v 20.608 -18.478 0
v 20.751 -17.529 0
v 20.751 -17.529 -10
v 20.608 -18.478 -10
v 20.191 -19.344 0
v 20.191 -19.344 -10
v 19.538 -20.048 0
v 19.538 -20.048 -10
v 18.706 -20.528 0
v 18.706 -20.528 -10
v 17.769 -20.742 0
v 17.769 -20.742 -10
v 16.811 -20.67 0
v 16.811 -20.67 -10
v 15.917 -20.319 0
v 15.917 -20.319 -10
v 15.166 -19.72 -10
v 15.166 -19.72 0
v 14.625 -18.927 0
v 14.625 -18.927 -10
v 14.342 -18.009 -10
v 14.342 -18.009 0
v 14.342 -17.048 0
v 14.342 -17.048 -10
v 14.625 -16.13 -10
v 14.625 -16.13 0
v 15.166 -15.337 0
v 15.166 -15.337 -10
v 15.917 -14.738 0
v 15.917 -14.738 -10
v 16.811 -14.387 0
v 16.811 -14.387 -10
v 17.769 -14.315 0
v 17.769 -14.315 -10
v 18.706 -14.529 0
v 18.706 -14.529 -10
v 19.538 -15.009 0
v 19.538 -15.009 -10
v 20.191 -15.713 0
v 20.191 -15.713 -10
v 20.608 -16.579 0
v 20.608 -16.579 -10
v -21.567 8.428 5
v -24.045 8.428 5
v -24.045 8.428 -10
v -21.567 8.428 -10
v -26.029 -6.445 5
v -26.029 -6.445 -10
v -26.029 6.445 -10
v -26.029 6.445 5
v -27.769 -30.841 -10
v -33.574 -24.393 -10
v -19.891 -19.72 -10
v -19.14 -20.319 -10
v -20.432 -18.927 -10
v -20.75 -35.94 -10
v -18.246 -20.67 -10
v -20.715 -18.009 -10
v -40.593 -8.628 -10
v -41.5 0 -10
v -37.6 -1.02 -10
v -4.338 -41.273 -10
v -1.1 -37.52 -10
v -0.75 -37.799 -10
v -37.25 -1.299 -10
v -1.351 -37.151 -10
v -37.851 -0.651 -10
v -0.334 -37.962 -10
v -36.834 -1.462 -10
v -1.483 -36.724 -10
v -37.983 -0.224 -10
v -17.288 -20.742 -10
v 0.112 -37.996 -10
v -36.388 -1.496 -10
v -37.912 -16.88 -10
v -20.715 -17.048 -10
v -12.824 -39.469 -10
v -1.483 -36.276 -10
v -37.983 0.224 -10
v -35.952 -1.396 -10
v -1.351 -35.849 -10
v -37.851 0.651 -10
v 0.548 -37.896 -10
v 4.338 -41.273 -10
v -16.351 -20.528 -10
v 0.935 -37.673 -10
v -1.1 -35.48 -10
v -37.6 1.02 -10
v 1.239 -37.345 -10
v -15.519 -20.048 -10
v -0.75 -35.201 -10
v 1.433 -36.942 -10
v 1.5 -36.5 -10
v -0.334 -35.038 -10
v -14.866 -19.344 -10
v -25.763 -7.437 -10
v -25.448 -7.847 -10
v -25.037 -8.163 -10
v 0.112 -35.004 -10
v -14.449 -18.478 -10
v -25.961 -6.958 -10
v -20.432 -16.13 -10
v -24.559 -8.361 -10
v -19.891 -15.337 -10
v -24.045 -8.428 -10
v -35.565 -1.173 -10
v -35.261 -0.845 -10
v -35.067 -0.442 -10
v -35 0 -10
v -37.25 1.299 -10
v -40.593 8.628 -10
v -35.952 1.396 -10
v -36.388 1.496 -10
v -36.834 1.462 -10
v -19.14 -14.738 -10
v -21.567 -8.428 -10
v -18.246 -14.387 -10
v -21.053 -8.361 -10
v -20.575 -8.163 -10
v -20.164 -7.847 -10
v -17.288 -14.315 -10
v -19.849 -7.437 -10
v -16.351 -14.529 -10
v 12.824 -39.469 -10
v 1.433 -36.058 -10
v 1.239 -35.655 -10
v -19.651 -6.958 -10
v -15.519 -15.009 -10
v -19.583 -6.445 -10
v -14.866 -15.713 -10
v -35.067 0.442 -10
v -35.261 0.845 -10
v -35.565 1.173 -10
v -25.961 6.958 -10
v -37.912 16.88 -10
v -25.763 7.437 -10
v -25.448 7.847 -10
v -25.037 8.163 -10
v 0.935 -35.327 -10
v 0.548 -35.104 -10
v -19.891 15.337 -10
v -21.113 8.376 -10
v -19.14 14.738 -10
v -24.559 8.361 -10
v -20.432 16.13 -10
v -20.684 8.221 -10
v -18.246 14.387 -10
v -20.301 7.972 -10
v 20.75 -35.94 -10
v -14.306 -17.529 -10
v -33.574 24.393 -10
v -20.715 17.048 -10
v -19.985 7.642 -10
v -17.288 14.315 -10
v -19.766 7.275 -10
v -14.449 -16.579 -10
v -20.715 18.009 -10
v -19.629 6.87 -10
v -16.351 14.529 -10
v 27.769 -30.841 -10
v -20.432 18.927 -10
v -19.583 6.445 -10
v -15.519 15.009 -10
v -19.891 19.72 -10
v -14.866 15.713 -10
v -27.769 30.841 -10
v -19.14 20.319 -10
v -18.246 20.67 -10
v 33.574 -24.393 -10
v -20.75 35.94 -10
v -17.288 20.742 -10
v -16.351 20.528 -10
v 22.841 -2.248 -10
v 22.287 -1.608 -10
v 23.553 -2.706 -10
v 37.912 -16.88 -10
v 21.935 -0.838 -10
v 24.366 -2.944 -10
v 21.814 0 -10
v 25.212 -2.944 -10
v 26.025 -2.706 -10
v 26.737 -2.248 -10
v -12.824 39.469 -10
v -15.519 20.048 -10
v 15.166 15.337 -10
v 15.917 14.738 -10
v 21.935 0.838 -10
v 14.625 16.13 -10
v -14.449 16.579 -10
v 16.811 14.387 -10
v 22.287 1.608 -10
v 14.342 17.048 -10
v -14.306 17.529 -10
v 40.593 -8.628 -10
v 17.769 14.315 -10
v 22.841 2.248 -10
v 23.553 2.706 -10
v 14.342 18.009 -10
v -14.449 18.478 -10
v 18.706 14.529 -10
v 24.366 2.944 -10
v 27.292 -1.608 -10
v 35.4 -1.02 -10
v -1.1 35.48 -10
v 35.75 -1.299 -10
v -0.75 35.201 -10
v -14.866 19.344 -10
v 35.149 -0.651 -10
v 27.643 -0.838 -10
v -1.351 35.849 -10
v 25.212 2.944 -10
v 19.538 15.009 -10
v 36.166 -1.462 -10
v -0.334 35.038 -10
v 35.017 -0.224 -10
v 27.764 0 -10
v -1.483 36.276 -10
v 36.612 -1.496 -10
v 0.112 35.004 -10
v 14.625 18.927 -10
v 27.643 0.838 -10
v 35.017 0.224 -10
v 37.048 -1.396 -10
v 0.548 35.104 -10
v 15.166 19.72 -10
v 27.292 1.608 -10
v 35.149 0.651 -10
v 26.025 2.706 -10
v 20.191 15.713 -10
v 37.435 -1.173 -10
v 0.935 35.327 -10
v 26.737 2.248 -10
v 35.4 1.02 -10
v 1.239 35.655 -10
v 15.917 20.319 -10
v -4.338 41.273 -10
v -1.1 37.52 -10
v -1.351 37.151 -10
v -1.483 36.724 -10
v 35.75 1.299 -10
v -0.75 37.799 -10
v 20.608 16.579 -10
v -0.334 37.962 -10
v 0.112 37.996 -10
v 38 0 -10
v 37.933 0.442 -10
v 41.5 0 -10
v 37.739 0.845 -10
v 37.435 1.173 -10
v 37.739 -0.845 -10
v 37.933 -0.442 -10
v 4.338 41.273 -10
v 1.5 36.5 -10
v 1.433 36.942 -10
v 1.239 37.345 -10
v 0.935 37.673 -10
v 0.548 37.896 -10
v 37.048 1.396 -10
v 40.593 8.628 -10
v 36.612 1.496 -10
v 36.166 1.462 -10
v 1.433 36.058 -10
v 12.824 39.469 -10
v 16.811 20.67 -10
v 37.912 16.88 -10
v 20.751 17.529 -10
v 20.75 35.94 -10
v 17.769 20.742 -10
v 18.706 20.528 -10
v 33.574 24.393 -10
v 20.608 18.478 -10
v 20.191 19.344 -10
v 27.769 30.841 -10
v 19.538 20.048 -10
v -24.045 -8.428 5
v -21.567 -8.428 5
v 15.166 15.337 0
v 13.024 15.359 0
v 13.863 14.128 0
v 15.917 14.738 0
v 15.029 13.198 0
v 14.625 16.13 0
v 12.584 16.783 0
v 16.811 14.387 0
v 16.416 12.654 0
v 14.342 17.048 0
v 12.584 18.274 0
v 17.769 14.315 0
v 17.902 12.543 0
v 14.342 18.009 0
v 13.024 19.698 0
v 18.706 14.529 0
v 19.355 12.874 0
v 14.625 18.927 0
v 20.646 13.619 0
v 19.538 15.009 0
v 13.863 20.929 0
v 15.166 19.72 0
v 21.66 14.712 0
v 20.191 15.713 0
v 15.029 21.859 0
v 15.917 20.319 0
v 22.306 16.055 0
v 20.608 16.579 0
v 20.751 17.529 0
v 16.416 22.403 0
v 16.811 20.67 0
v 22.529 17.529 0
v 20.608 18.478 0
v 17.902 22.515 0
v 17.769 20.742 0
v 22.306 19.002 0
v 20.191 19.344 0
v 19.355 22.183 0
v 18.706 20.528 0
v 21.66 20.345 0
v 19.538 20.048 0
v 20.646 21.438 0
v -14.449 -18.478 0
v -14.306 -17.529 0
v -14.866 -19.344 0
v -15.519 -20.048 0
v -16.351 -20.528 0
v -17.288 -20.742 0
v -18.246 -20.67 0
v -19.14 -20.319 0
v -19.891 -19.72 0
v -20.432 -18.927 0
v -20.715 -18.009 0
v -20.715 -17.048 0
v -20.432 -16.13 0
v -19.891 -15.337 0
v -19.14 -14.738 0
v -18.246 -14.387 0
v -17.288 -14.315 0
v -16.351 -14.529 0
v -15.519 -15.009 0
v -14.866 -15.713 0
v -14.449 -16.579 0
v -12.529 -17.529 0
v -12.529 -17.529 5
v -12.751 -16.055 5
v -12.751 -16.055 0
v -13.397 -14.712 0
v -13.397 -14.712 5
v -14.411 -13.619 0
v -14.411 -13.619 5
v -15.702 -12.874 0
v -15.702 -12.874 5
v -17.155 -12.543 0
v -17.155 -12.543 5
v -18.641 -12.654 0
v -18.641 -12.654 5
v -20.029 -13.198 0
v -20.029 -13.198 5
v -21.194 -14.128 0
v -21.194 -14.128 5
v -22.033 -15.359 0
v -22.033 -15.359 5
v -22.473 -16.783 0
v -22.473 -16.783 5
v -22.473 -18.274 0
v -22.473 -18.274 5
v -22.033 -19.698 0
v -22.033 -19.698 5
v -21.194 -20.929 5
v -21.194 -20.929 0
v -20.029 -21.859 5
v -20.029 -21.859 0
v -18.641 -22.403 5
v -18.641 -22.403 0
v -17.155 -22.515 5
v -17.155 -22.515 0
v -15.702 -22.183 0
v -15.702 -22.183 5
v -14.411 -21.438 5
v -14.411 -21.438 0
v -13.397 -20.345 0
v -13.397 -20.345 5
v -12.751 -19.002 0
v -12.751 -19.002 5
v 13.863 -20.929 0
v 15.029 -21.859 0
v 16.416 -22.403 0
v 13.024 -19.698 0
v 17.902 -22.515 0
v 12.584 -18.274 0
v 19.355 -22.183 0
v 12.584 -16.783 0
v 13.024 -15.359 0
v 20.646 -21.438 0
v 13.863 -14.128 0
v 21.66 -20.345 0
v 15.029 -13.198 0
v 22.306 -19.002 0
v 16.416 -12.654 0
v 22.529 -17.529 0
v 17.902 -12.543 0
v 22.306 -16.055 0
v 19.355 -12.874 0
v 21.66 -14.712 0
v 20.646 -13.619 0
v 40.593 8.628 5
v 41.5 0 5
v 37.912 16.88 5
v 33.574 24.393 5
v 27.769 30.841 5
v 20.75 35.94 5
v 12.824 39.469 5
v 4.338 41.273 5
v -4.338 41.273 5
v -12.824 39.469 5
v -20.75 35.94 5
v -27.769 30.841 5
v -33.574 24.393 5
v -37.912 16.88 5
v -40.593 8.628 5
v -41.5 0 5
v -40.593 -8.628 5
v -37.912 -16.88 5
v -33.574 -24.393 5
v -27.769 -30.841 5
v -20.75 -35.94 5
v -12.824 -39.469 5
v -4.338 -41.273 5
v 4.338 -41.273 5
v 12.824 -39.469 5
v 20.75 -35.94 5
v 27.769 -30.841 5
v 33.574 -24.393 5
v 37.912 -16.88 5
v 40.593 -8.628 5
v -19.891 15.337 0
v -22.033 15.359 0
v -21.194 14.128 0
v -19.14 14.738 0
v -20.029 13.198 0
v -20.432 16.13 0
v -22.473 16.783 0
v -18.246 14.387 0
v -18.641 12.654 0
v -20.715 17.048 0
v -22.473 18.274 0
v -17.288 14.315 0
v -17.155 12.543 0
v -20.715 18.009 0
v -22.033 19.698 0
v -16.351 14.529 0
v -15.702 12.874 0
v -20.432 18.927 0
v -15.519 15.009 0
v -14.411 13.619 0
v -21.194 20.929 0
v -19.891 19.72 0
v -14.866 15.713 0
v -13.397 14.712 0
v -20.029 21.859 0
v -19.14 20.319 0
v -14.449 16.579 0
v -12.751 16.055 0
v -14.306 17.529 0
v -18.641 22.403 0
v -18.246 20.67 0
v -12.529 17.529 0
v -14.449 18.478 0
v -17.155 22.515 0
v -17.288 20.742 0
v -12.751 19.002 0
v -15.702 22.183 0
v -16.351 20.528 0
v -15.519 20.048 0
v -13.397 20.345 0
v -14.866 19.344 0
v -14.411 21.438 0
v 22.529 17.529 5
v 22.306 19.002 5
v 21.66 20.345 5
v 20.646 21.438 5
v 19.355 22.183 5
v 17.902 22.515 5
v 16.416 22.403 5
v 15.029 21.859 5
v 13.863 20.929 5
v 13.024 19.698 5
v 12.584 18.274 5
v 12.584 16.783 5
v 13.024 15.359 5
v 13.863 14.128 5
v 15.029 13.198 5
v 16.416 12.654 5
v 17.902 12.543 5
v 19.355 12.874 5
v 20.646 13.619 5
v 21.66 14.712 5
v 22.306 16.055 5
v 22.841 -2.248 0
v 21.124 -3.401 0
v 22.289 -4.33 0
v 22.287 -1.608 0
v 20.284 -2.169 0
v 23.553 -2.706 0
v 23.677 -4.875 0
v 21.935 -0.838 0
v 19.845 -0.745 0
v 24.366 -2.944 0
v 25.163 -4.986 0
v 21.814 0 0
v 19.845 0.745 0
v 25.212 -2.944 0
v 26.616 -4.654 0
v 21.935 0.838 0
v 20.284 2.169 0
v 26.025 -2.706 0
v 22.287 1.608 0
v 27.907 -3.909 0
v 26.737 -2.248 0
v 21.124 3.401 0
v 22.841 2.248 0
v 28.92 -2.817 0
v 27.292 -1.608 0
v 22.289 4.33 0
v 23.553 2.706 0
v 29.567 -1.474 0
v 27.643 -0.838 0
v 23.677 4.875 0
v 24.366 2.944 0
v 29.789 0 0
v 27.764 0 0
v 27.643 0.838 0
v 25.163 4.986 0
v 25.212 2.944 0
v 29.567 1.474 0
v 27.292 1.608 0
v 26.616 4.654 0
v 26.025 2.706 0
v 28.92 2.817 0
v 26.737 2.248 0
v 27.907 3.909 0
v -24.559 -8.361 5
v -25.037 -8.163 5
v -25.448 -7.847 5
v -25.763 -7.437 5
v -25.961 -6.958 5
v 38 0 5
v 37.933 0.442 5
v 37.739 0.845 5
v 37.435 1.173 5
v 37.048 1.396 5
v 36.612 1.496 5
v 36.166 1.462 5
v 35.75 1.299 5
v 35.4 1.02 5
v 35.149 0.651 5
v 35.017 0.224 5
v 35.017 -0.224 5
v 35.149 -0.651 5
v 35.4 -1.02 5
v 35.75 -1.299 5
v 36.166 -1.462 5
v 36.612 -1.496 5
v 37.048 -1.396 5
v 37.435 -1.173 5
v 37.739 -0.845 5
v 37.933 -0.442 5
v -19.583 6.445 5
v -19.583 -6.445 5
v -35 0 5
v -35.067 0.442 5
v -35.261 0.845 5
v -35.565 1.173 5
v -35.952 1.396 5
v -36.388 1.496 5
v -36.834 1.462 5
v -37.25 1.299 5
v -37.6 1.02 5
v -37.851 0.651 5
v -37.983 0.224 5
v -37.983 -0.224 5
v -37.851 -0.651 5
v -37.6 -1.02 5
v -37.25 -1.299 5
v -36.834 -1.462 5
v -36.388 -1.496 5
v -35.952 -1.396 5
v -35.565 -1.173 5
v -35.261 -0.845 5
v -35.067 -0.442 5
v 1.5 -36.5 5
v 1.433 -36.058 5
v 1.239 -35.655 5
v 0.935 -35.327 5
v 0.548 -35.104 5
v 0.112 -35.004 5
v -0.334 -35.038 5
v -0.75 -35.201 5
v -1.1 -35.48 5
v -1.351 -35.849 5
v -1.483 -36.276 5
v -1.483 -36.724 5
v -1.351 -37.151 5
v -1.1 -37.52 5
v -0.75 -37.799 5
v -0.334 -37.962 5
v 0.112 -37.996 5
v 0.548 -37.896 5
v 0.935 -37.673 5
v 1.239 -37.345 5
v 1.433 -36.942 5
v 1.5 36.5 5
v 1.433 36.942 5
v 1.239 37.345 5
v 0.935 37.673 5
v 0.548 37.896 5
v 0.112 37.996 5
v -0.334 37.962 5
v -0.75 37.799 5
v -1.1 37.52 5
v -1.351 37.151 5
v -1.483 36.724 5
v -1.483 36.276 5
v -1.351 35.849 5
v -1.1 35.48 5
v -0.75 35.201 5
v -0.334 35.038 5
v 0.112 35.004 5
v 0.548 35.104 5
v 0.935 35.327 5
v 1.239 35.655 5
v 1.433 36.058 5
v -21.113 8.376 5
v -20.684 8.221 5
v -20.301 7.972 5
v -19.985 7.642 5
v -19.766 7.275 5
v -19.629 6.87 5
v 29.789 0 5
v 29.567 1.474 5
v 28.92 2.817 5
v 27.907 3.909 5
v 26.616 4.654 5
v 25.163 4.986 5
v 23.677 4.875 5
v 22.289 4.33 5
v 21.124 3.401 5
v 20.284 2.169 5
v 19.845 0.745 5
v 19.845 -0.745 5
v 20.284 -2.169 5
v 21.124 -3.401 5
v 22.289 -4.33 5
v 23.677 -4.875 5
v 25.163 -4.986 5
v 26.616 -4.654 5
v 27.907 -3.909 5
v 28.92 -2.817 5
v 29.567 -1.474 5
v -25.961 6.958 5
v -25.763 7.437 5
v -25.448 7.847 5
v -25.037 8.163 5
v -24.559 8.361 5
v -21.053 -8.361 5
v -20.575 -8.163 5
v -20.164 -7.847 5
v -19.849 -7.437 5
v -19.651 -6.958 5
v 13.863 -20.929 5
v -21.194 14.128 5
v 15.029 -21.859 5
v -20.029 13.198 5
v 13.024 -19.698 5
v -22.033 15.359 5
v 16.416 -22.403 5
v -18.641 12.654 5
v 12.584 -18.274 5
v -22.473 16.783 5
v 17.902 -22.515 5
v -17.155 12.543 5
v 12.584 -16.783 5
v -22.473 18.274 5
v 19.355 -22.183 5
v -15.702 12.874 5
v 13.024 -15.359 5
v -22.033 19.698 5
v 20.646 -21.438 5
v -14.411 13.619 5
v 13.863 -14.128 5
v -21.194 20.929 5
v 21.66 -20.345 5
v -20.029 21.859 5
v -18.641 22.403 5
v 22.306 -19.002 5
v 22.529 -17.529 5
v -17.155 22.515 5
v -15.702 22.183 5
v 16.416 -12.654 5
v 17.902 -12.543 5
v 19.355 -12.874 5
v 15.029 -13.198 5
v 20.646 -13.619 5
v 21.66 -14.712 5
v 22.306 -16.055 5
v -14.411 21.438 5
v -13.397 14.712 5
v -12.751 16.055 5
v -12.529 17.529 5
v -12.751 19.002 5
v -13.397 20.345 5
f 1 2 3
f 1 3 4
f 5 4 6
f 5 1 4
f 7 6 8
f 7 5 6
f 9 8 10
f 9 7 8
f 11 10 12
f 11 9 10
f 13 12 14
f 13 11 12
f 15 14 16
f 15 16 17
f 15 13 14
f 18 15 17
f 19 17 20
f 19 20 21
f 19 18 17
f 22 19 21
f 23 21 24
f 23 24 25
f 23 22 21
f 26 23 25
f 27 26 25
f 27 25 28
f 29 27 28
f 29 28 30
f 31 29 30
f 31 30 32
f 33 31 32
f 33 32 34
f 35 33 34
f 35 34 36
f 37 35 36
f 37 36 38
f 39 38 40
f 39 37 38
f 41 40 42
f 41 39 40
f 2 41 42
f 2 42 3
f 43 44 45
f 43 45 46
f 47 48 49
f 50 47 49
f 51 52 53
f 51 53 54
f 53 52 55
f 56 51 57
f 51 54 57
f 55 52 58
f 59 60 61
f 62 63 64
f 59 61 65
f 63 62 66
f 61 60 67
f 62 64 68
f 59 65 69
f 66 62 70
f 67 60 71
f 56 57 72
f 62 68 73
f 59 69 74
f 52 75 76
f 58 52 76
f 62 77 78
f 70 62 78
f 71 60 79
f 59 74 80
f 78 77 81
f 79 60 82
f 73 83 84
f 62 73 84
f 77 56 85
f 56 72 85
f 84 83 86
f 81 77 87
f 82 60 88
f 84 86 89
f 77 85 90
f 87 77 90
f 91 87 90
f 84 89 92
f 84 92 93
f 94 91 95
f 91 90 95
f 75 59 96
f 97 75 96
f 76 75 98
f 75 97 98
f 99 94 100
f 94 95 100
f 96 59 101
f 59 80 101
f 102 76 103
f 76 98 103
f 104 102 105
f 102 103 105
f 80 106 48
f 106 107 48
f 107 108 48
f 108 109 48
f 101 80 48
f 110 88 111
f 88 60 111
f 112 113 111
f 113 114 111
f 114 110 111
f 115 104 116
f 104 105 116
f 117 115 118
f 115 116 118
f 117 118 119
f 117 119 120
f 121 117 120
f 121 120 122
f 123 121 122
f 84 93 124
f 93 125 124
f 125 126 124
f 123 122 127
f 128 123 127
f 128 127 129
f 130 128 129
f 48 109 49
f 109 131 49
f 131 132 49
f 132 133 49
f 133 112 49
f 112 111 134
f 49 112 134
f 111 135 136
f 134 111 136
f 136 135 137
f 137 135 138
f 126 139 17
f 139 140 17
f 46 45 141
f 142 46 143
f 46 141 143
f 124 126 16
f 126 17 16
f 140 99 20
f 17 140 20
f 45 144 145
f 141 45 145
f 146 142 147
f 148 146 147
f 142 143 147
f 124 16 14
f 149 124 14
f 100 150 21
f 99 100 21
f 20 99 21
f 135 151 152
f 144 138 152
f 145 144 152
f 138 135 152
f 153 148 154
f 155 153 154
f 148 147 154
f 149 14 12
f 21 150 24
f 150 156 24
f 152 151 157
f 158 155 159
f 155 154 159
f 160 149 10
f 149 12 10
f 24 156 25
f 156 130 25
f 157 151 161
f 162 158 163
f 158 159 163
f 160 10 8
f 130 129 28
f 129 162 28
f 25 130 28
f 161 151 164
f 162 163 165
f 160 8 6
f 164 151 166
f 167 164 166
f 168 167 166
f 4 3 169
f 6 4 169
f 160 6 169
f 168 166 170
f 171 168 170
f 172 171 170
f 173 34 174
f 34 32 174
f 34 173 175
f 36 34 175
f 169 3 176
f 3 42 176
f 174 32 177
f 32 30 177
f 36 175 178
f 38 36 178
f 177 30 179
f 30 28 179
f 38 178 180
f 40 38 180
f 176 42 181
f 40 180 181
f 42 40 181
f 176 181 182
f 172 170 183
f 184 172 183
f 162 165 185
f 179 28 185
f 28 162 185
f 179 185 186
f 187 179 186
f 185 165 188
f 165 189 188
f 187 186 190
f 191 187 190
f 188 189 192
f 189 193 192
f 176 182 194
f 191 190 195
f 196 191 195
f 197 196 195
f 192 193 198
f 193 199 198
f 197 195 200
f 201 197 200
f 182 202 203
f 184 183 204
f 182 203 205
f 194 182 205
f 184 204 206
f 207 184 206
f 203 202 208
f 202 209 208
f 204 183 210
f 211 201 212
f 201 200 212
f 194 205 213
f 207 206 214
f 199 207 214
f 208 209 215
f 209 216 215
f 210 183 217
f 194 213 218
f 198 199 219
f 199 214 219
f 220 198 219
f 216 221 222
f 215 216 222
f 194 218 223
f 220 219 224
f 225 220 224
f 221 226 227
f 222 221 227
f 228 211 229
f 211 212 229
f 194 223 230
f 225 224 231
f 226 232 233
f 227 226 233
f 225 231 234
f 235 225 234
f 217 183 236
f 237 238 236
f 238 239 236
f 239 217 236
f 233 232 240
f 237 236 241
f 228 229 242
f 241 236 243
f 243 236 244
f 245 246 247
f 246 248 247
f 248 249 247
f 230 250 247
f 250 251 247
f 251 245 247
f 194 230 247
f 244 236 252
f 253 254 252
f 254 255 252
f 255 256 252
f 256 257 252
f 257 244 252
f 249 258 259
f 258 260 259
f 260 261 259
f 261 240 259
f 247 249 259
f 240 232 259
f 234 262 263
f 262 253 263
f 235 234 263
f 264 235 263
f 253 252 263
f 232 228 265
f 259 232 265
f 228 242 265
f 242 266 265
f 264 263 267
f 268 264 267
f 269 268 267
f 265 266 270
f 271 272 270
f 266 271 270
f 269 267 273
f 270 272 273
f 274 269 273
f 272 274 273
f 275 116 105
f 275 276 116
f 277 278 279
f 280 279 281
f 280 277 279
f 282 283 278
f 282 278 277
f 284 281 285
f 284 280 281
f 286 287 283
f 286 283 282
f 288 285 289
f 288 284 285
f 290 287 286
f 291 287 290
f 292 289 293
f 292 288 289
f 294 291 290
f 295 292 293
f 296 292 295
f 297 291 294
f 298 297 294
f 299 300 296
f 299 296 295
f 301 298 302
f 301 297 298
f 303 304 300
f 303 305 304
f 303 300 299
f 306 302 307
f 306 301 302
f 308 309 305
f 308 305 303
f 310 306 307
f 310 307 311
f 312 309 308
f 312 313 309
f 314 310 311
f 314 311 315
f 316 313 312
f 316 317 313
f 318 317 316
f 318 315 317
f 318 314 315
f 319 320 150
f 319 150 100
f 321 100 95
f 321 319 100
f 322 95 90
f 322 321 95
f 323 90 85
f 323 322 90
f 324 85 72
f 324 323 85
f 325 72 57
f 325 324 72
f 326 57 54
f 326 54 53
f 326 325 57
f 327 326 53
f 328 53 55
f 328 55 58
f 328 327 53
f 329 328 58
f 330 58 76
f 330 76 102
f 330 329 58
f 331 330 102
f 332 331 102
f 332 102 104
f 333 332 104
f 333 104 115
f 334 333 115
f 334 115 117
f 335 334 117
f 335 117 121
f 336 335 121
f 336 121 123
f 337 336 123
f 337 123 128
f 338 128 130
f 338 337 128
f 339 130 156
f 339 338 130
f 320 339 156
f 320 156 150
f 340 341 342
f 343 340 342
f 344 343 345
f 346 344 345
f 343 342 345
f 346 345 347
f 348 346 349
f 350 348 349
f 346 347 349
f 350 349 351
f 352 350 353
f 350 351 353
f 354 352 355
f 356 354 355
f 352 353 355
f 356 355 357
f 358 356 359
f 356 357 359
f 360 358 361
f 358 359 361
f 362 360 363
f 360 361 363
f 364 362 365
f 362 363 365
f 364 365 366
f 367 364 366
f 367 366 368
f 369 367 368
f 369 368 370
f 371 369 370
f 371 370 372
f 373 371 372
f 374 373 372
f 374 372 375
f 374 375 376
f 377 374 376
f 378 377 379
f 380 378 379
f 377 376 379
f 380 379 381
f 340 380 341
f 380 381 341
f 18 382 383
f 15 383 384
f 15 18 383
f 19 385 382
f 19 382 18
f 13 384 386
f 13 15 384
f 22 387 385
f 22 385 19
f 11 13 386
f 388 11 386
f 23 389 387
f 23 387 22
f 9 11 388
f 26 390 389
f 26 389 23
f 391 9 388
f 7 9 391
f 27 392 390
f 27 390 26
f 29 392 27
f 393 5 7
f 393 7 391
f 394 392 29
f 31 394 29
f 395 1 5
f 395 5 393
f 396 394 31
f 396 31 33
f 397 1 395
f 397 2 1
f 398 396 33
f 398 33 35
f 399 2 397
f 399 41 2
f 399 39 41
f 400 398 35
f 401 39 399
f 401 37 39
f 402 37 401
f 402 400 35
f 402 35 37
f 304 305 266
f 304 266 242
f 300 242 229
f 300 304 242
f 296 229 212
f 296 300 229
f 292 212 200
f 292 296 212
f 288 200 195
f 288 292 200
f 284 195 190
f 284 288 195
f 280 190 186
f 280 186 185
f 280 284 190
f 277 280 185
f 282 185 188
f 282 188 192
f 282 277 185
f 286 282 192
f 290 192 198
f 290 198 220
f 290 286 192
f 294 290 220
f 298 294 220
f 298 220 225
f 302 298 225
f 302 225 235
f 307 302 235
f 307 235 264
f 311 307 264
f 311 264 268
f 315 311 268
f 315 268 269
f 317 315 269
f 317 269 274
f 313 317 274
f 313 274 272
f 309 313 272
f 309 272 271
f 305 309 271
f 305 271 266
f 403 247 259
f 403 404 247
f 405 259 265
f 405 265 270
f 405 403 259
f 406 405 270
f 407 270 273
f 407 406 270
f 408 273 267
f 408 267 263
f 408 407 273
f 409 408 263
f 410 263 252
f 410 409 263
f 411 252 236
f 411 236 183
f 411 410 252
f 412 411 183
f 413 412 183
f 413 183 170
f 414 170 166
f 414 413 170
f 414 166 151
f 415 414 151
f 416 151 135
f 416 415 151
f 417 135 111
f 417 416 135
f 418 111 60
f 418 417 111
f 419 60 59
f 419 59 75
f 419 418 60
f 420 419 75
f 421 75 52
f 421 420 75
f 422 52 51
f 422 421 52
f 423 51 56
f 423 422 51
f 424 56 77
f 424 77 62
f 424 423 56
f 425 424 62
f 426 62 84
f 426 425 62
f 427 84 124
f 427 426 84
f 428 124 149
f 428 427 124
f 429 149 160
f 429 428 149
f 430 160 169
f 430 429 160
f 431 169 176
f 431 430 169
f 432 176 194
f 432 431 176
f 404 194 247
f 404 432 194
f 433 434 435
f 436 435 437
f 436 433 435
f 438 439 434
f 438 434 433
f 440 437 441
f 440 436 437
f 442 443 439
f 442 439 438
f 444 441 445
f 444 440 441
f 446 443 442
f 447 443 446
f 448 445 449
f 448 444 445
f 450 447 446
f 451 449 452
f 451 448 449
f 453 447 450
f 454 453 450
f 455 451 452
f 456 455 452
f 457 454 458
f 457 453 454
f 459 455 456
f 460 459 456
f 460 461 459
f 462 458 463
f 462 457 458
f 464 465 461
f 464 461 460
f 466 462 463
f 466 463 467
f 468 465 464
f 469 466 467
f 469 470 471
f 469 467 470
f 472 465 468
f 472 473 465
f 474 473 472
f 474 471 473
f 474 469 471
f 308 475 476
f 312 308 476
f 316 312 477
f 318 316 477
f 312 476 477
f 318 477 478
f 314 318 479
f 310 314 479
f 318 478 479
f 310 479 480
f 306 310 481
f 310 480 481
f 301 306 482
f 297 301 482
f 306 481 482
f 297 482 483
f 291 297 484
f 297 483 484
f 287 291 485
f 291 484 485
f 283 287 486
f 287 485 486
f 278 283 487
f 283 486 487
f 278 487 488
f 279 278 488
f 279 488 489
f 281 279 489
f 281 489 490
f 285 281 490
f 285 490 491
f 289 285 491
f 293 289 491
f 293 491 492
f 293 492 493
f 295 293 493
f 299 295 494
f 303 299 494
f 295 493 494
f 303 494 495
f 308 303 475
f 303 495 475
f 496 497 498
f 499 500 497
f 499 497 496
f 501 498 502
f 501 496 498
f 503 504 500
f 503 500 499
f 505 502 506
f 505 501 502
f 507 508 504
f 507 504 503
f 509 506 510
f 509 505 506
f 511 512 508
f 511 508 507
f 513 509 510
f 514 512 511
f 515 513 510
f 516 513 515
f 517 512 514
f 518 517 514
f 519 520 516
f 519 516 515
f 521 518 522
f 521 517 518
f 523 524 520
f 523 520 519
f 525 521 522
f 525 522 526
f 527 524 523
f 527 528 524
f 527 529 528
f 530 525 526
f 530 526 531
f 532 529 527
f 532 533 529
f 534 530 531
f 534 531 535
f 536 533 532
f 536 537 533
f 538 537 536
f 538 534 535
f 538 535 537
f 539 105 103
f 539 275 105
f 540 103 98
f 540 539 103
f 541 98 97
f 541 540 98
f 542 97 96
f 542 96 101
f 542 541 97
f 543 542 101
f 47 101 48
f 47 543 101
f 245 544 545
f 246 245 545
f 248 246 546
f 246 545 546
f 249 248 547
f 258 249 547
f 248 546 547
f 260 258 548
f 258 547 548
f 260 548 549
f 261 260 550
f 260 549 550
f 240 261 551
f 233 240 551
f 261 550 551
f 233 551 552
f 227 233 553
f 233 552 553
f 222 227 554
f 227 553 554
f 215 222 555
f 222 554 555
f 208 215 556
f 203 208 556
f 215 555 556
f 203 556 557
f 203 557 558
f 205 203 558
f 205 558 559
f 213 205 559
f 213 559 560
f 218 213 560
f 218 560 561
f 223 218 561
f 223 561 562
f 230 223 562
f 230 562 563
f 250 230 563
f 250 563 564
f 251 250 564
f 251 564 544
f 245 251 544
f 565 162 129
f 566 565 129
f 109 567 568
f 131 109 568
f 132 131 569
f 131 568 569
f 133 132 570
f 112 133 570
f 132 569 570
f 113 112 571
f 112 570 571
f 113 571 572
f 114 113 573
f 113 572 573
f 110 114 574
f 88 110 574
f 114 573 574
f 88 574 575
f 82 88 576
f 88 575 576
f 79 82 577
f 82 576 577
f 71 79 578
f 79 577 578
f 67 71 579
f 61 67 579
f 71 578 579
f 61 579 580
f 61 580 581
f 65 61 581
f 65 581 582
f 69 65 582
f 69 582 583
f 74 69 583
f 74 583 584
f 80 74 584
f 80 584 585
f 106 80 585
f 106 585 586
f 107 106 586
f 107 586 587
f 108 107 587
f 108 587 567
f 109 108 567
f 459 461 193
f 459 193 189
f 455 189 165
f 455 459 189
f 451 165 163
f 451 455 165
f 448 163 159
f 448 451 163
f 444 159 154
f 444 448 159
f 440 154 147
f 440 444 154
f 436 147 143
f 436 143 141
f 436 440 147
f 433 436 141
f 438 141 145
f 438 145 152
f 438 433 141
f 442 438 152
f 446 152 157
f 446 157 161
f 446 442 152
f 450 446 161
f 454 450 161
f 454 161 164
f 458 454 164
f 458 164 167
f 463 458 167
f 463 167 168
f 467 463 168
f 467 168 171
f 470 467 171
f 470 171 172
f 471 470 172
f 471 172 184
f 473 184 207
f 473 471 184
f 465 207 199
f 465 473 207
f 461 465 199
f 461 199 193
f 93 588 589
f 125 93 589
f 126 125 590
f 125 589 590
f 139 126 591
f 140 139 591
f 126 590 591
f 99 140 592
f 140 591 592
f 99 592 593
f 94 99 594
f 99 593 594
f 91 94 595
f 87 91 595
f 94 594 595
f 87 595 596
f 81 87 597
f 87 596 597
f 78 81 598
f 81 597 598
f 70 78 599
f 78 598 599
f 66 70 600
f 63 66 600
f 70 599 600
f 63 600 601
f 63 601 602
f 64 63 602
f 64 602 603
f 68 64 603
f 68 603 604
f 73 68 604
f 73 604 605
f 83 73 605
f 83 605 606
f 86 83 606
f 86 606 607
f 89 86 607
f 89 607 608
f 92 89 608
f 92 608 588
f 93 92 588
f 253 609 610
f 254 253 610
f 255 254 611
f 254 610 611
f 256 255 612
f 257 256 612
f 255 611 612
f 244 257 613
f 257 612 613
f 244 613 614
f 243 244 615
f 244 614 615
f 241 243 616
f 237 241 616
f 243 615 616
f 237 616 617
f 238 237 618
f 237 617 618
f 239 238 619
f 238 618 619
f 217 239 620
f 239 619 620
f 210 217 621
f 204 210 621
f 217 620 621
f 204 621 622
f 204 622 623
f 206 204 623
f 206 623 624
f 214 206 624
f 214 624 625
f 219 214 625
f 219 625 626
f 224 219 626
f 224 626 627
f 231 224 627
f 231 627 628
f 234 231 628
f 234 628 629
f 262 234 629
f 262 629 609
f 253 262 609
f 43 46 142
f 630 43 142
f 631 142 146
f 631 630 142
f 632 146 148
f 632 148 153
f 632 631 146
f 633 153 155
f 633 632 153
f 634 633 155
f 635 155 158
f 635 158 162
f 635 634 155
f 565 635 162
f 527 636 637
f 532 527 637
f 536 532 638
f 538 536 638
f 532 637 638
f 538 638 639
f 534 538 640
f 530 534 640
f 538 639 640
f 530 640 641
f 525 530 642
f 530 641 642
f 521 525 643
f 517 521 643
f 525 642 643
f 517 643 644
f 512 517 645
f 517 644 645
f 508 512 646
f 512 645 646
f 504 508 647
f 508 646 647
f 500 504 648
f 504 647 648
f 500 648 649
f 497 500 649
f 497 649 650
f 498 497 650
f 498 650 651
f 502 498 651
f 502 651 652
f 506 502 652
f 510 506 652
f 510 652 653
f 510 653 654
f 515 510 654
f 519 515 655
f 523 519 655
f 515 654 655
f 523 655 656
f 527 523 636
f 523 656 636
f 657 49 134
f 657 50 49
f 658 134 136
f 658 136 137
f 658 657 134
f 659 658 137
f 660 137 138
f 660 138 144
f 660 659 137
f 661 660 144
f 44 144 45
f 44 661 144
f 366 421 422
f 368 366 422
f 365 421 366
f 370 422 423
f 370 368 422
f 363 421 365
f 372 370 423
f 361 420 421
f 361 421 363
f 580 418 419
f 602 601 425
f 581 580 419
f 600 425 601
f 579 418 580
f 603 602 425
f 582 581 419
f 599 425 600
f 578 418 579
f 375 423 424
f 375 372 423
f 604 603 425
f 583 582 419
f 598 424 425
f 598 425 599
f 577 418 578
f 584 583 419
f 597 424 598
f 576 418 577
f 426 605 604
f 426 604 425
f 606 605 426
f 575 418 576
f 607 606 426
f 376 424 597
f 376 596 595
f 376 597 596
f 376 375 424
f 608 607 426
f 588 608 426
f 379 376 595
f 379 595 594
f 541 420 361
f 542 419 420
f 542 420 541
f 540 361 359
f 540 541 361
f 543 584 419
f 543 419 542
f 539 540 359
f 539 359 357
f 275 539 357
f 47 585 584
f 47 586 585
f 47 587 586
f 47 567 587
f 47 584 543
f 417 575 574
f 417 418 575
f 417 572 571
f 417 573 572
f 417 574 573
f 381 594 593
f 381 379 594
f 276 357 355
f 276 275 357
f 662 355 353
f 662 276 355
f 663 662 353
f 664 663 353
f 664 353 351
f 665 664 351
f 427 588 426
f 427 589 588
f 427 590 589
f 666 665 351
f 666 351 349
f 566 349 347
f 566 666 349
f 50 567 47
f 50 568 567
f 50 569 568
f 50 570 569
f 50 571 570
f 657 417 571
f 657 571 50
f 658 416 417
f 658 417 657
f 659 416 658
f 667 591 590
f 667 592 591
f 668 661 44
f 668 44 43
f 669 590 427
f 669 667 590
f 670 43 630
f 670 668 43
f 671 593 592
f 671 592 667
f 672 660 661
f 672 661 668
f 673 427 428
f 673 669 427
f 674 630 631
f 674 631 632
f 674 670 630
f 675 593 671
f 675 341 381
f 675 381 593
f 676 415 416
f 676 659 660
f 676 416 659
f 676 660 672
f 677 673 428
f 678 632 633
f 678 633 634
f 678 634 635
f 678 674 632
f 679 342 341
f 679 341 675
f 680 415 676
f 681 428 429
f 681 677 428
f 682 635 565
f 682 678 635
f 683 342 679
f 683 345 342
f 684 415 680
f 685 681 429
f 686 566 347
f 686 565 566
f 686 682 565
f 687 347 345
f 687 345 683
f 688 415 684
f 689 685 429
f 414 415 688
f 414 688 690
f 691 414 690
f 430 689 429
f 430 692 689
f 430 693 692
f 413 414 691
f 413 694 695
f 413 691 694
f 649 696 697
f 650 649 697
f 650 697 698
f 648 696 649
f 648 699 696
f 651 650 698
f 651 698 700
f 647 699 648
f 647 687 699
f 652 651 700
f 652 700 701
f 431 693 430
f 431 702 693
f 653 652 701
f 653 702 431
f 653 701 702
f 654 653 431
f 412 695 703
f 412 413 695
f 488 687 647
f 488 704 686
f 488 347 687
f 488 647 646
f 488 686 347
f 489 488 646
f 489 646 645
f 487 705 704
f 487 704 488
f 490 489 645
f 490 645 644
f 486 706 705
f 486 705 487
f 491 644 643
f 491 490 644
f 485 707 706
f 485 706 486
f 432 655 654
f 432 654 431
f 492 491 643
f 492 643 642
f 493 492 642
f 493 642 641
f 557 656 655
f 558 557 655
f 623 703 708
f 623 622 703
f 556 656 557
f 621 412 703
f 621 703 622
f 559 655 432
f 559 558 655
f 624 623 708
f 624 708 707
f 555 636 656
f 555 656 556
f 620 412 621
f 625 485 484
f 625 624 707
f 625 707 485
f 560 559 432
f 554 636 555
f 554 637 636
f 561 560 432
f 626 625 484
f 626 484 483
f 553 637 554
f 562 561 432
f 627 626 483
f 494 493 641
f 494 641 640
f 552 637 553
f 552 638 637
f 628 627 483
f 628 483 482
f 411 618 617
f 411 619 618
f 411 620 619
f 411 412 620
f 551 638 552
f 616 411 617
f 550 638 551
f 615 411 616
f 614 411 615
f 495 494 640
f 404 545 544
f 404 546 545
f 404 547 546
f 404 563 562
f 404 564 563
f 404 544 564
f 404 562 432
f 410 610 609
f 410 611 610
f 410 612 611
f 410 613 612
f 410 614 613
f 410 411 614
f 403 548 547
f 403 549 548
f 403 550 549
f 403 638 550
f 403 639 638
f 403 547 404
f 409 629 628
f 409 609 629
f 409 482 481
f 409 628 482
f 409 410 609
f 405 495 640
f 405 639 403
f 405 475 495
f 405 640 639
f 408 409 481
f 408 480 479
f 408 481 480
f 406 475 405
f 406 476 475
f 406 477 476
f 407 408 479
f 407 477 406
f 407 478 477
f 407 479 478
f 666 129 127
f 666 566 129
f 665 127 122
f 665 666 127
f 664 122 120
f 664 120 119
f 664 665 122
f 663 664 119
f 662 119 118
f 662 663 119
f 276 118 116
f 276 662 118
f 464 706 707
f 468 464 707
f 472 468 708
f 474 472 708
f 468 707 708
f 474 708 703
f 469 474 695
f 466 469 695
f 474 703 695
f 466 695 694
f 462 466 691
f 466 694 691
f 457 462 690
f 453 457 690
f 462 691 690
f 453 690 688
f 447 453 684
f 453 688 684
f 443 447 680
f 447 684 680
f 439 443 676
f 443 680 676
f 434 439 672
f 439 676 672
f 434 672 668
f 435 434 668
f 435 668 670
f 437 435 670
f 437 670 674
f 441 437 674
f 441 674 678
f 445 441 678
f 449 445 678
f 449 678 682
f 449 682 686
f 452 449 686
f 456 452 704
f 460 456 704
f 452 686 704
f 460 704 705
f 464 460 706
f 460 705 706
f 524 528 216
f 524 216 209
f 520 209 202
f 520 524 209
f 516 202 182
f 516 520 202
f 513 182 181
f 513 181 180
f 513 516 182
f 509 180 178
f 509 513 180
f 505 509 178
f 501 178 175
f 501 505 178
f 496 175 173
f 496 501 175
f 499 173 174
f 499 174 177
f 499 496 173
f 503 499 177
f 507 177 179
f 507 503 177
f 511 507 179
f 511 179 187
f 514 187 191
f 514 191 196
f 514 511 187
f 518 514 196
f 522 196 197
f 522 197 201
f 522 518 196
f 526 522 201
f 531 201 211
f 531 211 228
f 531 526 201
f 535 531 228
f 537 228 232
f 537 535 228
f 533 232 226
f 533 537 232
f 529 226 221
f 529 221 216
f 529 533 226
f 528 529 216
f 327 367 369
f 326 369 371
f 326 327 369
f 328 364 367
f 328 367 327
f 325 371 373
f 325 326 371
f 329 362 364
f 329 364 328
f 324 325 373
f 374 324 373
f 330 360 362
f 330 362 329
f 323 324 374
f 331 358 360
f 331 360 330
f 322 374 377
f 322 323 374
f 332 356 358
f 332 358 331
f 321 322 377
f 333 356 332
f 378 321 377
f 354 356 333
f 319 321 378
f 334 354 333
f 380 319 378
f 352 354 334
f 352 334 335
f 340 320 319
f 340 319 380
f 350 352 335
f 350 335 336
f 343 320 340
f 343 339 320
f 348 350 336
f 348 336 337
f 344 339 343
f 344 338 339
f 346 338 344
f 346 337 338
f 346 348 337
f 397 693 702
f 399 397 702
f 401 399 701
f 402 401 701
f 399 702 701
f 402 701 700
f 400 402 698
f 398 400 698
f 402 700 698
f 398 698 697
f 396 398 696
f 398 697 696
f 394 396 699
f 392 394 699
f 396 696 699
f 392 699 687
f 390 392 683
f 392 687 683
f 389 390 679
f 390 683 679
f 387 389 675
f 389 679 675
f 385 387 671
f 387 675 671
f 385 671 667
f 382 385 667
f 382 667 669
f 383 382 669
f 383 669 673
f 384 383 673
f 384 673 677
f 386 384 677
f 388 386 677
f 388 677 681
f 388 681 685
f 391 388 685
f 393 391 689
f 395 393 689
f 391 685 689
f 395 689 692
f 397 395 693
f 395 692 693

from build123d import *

# Parameters (mm, degrees)
SKETCH_1_R           = 41.5
EXTRUDE_1_DEPTH      = 5
EXTRUDE_1_DEPTH_BACK = 10
SKETCH_2_R           = 5
CUT_EXTRUDE_1_DEPTH  = 5
SKETCH_4_R           = 1.5
CUT_EXTRUDE_2_DEPTH  = 16


with BuildPart() as part:
    # 草图1 → 凸台-拉伸1 (new body, two sides)
    with BuildSketch(Plane.XY) as extrude_1_sk:
        Circle(SKETCH_1_R)
        with BuildLine():
            ThreePointArc((-20.75113276, -17.528548354), (-17.528548354, -14.305963949), (-14.305963949, -17.528548354))
            ThreePointArc((-14.305963949, -17.528548354), (-17.528548354, -20.75113276), (-20.75113276, -17.528548354))
        make_face(mode=Mode.SUBTRACT)
        with BuildLine():
            ThreePointArc((14.305963949, -17.528548354), (17.528548354, -14.305963949), (20.75113276, -17.528548354))
            ThreePointArc((20.75113276, -17.528548354), (17.528548354, -20.75113276), (14.305963949, -17.528548354))
        make_face(mode=Mode.SUBTRACT)
        with BuildLine():
            Line((-24.045437487, 8.428297676), (-21.566526406, 8.428297676))
            ThreePointArc((-21.566526406, 8.428297676), (-20.68362959, 8.220920288), (-19.985383241, 7.642159365))
            ThreePointArc((-19.985383241, 7.642159365), (-19.686578169, 7.076512396), (-19.583397541, 6.445168811))
            Line((-19.583397541, 6.445168811), (-19.583397541, -6.445168811))
            ThreePointArc((-19.583397541, -6.445168811), (-20.164242538, -7.847452679), (-21.566526406, -8.428297676))
            Line((-21.566526406, -8.428297676), (-24.045437487, -8.428297676))
            ThreePointArc((-24.045437487, -8.428297676), (-25.447721356, -7.847452679), (-26.028566352, -6.445168811))
            Line((-26.028566352, -6.445168811), (-26.028566352, 6.445168811))
            ThreePointArc((-26.028566352, 6.445168811), (-25.447721356, 7.847452679), (-24.045437487, 8.428297676))
        make_face(mode=Mode.SUBTRACT)
        with BuildLine():
            ThreePointArc((-20.75113276, 17.528548354), (-17.528548354, 20.75113276), (-14.305963949, 17.528548354))
            ThreePointArc((-14.305963949, 17.528548354), (-17.528548354, 14.305963949), (-20.75113276, 17.528548354))
        make_face(mode=Mode.SUBTRACT)
        with BuildLine():
            ThreePointArc((14.305963949, 17.528548354), (17.528548354, 20.75113276), (20.75113276, 17.528548354))
            ThreePointArc((20.75113276, 17.528548354), (17.528548354, 14.305963949), (14.305963949, 17.528548354))
        make_face(mode=Mode.SUBTRACT)
        with BuildLine():
            ThreePointArc((21.814417514, 0), (24.789110812, 2.974693297), (27.763804109, 0))
            ThreePointArc((27.763804109, 0), (24.789110812, -2.974693297), (21.814417514, 0))
        make_face(mode=Mode.SUBTRACT)
    extrude(amount=EXTRUDE_1_DEPTH)
    extrude(extrude_1_sk.sketch, amount=-EXTRUDE_1_DEPTH_BACK)

    # 草图2 → 切除-拉伸1 (cut)
    with BuildSketch(Plane.XY.offset(5)):
        with Locations((-17.528548354, 17.528548354)):
            Circle(SKETCH_2_R)
        with BuildLine():
            ThreePointArc((-20.75113276, 17.528548354), (-17.528548354, 14.305963949), (-14.305963949, 17.528548354))
            ThreePointArc((-14.305963949, 17.528548354), (-17.528548354, 20.75113276), (-20.75113276, 17.528548354))
        make_face(mode=Mode.SUBTRACT)
        with Locations((17.528548354, 17.528548354)):
            Circle(SKETCH_2_R)
        with BuildLine():
            ThreePointArc((20.75113276, 17.528548354), (17.528548354, 20.75113276), (14.305963949, 17.528548354))
            ThreePointArc((14.305963949, 17.528548354), (17.528548354, 14.305963949), (20.75113276, 17.528548354))
        make_face(mode=Mode.SUBTRACT)
        with Locations((-17.528548354, -17.528548354)):
            Circle(SKETCH_2_R)
        with BuildLine():
            ThreePointArc((-20.75113276, -17.528548354), (-17.528548354, -20.75113276), (-14.305963949, -17.528548354))
            ThreePointArc((-14.305963949, -17.528548354), (-17.528548354, -14.305963949), (-20.75113276, -17.528548354))
        make_face(mode=Mode.SUBTRACT)
        with Locations((17.528548354, -17.528548354)):
            Circle(SKETCH_2_R)
        with BuildLine():
            ThreePointArc((14.305963949, -17.528548354), (17.528548354, -20.75113276), (20.75113276, -17.528548354))
            ThreePointArc((20.75113276, -17.528548354), (17.528548354, -14.305963949), (14.305963949, -17.528548354))
        make_face(mode=Mode.SUBTRACT)
        with Locations((24.789110812, 0)):
            Circle(SKETCH_2_R)
        with BuildLine():
            ThreePointArc((21.814417514, 0), (24.789110812, -2.974693297), (27.763804109, 0))
            ThreePointArc((27.763804109, 0), (24.789110812, 2.974693297), (21.814417514, 0))
        make_face(mode=Mode.SUBTRACT)
    extrude(amount=-CUT_EXTRUDE_1_DEPTH, mode=Mode.SUBTRACT)

    # 草图4 → 切除-拉伸2 (cut, through all)
    with BuildSketch(Plane.XY.offset(5)):
        with Locations((-36.5, 0)):
            Circle(SKETCH_4_R)
        with Locations((0, -36.5)):
            Circle(SKETCH_4_R)
        with Locations((36.5, 0)):
            Circle(SKETCH_4_R)
        with Locations((0, 36.5)):
            Circle(SKETCH_4_R)
    extrude(amount=-CUT_EXTRUDE_2_DEPTH, mode=Mode.SUBTRACT)


solid = part.part
